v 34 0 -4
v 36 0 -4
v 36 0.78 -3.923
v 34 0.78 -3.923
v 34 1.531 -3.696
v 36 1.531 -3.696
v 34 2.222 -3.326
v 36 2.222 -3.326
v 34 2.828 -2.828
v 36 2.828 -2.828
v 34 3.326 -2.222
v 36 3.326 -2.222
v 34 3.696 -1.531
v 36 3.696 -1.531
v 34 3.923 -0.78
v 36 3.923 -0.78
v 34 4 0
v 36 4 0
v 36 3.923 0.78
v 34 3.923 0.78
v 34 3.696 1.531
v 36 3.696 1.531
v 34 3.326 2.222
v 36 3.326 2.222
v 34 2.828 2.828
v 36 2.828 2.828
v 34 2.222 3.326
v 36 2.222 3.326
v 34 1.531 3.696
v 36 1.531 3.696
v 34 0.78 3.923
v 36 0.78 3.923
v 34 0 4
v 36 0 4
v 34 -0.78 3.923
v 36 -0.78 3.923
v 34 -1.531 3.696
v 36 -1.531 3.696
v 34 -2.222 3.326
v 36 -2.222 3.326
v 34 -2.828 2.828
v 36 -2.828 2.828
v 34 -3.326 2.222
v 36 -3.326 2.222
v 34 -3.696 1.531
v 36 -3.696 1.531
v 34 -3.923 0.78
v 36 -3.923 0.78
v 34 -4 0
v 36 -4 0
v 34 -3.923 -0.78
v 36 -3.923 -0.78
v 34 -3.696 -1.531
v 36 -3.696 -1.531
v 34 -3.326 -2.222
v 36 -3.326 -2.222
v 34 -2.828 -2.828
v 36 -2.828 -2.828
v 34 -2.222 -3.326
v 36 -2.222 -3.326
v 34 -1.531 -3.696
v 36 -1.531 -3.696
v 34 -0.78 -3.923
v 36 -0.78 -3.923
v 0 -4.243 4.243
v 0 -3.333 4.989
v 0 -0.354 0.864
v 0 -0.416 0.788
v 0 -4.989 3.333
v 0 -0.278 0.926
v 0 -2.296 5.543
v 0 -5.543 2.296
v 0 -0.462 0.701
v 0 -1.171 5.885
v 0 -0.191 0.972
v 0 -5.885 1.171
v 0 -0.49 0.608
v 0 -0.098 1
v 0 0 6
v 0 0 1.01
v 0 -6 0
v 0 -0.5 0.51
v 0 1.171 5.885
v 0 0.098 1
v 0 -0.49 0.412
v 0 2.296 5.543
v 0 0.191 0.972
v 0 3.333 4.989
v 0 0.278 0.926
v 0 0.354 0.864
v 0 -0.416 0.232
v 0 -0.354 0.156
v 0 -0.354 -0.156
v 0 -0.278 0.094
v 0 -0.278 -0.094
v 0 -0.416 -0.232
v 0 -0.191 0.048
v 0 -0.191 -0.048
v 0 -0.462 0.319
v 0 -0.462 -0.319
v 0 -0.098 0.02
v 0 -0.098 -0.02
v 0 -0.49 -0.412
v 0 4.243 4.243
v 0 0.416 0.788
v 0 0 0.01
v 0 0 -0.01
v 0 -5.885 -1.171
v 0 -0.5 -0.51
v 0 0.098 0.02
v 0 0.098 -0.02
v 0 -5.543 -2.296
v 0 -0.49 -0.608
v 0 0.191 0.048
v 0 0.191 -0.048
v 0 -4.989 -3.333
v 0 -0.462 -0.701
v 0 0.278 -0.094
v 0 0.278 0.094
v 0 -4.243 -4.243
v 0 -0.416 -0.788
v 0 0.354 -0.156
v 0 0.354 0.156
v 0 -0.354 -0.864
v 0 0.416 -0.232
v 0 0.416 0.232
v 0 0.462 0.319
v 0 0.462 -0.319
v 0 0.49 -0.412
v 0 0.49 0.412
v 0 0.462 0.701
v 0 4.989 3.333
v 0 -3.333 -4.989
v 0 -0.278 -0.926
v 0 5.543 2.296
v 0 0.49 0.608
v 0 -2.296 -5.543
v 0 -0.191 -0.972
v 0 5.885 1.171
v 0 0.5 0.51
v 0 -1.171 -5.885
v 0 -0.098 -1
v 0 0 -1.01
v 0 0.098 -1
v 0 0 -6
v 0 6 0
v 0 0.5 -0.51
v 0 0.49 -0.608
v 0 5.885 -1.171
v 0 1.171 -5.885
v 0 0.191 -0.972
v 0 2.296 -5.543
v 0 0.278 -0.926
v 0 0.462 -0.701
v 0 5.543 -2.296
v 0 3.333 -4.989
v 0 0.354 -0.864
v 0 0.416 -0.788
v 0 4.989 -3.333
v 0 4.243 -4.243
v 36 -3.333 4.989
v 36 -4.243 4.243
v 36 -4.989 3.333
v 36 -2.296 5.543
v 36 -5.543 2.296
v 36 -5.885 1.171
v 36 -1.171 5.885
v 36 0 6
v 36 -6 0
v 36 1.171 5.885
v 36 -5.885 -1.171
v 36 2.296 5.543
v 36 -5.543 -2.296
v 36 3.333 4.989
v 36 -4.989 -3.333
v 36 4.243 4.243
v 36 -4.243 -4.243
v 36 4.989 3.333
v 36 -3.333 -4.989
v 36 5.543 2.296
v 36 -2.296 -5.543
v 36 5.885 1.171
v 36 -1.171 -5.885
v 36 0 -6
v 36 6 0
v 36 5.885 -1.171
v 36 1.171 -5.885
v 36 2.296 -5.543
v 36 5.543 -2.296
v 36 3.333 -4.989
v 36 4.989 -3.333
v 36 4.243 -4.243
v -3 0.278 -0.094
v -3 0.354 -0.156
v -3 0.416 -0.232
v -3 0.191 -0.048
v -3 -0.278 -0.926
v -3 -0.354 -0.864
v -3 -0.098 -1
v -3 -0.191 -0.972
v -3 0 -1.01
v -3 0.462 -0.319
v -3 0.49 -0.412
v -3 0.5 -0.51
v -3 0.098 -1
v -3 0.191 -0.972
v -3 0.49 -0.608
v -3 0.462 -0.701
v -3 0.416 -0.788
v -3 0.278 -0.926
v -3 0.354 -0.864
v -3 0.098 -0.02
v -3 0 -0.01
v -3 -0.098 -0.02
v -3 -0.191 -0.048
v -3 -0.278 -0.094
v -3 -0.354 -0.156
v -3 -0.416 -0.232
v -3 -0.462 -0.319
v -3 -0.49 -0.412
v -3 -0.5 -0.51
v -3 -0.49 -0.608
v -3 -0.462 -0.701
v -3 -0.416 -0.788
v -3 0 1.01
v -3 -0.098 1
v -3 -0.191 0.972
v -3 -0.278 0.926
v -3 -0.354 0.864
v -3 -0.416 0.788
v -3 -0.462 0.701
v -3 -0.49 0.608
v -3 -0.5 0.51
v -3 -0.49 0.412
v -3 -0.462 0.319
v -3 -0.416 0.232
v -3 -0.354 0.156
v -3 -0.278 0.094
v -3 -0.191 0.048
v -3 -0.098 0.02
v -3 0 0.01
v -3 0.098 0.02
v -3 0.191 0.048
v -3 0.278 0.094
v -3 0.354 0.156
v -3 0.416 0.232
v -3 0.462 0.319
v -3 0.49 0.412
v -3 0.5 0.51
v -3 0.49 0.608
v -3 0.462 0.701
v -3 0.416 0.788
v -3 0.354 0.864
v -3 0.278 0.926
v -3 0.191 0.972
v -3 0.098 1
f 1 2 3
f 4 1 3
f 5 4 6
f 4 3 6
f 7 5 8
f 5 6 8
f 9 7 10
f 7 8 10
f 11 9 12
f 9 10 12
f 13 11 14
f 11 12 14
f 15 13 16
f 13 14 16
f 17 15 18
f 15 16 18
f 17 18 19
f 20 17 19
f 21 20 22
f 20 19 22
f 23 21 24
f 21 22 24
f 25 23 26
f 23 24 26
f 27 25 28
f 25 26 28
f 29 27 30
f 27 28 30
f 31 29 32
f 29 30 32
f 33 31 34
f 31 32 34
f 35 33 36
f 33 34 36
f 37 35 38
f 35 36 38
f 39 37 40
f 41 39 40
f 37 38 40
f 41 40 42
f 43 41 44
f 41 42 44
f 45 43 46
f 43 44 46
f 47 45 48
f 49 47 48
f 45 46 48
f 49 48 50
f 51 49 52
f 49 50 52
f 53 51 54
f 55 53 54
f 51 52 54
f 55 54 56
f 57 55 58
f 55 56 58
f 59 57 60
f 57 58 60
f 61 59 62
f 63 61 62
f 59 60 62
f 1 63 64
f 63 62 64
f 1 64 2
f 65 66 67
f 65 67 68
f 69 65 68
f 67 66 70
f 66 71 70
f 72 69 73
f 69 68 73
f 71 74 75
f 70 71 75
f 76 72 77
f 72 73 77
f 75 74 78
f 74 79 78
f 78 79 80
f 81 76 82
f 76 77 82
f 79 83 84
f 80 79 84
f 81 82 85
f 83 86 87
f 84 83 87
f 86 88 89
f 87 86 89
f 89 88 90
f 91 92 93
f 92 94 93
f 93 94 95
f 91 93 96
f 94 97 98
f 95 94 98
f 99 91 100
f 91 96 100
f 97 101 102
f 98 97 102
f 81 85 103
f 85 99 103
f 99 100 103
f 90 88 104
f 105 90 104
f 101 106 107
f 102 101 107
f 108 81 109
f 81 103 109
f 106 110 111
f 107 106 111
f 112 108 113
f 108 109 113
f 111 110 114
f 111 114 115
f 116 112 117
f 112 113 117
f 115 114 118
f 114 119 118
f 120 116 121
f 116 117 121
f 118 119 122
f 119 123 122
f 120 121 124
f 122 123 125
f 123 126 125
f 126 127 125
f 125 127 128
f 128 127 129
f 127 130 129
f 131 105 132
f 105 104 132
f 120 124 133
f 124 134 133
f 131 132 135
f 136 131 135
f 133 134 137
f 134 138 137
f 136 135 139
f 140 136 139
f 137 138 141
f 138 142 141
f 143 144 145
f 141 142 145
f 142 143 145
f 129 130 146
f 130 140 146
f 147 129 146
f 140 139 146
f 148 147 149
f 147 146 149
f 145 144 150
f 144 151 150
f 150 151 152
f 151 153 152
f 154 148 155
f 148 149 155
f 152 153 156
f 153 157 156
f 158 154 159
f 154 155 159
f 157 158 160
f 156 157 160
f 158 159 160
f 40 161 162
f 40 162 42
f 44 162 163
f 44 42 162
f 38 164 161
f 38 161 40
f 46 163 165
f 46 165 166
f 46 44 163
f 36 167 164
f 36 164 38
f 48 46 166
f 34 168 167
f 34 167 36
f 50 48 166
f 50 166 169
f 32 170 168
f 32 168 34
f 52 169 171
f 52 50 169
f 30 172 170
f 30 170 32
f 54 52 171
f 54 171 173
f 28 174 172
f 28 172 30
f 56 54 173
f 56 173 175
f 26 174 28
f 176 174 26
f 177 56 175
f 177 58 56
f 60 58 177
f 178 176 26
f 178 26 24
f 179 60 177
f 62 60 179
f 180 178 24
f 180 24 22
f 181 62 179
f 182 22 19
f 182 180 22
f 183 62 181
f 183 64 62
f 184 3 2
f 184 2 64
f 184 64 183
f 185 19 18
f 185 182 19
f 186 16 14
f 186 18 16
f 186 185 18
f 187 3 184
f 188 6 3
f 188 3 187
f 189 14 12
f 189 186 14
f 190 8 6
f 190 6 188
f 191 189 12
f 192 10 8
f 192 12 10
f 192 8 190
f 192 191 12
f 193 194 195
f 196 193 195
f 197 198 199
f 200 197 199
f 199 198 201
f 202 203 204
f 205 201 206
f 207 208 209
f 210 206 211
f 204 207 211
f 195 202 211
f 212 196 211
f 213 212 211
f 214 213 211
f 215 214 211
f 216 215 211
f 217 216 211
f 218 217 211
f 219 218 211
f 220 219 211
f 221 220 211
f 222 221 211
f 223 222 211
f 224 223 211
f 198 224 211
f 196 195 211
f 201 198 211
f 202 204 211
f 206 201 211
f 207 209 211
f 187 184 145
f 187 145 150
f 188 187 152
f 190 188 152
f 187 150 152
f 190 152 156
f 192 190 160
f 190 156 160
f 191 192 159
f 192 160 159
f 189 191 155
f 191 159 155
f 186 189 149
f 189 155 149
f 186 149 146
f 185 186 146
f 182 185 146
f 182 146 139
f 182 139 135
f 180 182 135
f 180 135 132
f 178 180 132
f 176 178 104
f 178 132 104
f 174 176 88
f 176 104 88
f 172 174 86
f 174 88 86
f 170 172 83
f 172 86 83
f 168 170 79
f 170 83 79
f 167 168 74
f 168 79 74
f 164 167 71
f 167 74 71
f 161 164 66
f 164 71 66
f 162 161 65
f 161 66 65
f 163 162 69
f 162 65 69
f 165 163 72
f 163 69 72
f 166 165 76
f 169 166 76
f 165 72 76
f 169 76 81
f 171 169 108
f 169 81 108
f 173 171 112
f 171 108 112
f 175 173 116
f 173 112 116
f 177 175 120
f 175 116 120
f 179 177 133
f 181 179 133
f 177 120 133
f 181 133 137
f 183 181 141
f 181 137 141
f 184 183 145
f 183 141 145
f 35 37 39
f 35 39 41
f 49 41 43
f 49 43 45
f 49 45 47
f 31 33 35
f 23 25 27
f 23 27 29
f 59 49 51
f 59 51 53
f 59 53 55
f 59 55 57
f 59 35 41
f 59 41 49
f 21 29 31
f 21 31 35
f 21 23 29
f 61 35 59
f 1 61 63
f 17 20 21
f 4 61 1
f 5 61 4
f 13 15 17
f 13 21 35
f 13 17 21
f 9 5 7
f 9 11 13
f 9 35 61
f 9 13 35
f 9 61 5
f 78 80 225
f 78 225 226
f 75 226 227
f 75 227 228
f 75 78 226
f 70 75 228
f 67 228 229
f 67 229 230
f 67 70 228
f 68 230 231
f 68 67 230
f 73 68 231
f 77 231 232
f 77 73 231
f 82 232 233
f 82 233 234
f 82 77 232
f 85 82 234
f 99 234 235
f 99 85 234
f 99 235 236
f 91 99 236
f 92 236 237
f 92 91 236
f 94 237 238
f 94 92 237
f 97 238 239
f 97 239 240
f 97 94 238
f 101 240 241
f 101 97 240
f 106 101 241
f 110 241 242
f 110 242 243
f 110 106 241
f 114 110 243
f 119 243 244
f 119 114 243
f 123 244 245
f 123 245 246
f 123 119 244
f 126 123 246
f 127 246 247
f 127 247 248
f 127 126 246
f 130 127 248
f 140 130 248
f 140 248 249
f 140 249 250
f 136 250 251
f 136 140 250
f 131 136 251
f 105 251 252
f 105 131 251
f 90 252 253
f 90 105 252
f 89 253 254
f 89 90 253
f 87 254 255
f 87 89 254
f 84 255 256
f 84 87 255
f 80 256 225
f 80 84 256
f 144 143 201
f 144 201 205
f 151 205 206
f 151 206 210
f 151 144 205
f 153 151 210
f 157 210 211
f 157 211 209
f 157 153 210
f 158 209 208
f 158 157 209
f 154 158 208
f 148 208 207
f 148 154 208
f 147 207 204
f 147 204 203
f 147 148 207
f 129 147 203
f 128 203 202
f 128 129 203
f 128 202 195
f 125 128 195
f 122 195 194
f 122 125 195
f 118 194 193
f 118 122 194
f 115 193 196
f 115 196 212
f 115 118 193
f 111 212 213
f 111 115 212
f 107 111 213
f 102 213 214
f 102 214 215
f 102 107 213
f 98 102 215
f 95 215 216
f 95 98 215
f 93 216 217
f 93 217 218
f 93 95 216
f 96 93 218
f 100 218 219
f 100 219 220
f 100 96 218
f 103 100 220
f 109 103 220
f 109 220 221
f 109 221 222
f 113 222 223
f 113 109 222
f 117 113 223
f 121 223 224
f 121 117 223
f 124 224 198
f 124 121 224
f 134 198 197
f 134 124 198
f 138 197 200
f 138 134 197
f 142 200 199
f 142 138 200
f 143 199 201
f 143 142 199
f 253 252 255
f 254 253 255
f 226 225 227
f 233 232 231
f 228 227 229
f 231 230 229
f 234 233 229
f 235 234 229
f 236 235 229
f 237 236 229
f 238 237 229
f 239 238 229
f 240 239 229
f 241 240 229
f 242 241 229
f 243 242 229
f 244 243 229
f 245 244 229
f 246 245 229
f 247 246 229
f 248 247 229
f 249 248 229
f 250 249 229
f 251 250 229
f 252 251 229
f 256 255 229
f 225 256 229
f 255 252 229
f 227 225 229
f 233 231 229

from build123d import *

# Parameters (mm, degrees)
SKETCH2_R           = 6
BOSS_EXTRUDE1_DEPTH = 36
SKETCH3_R           = 4
CUT_EXTRUDE1_DEPTH  = 2
SKETCH4_R           = 0.5
BOSS_EXTRUDE4_DEPTH = 3


with BuildPart() as part:
    # Sketch2 → Boss-Extrude1 (new body)
    with BuildSketch(Plane(origin=(0, 0, 0), x_dir=(0, 0, -1), z_dir=(1, 0, 0))):
        Circle(SKETCH2_R)
    extrude(amount=BOSS_EXTRUDE1_DEPTH)

    # Sketch3 → Cut-Extrude1 (cut)
    with BuildSketch(Plane(origin=(36, 0, 0), x_dir=(0, 0, -1), z_dir=(1, 0, 0))):
        Circle(SKETCH3_R)
    extrude(amount=-CUT_EXTRUDE1_DEPTH, mode=Mode.SUBTRACT)

    # Sketch4 → Boss-Extrude4 (add)
    with BuildSketch(Plane(origin=(0, 0, 0), x_dir=(0, 0, -1), z_dir=(1, 0, 0))):
        with Locations((0.51, 0)):
            Circle(SKETCH4_R)
        with Locations(Location((-0.51, 0, 0), (0, 0, 180))):
            Circle(SKETCH4_R)
    extrude(amount=-BOSS_EXTRUDE4_DEPTH)


solid = part.part
